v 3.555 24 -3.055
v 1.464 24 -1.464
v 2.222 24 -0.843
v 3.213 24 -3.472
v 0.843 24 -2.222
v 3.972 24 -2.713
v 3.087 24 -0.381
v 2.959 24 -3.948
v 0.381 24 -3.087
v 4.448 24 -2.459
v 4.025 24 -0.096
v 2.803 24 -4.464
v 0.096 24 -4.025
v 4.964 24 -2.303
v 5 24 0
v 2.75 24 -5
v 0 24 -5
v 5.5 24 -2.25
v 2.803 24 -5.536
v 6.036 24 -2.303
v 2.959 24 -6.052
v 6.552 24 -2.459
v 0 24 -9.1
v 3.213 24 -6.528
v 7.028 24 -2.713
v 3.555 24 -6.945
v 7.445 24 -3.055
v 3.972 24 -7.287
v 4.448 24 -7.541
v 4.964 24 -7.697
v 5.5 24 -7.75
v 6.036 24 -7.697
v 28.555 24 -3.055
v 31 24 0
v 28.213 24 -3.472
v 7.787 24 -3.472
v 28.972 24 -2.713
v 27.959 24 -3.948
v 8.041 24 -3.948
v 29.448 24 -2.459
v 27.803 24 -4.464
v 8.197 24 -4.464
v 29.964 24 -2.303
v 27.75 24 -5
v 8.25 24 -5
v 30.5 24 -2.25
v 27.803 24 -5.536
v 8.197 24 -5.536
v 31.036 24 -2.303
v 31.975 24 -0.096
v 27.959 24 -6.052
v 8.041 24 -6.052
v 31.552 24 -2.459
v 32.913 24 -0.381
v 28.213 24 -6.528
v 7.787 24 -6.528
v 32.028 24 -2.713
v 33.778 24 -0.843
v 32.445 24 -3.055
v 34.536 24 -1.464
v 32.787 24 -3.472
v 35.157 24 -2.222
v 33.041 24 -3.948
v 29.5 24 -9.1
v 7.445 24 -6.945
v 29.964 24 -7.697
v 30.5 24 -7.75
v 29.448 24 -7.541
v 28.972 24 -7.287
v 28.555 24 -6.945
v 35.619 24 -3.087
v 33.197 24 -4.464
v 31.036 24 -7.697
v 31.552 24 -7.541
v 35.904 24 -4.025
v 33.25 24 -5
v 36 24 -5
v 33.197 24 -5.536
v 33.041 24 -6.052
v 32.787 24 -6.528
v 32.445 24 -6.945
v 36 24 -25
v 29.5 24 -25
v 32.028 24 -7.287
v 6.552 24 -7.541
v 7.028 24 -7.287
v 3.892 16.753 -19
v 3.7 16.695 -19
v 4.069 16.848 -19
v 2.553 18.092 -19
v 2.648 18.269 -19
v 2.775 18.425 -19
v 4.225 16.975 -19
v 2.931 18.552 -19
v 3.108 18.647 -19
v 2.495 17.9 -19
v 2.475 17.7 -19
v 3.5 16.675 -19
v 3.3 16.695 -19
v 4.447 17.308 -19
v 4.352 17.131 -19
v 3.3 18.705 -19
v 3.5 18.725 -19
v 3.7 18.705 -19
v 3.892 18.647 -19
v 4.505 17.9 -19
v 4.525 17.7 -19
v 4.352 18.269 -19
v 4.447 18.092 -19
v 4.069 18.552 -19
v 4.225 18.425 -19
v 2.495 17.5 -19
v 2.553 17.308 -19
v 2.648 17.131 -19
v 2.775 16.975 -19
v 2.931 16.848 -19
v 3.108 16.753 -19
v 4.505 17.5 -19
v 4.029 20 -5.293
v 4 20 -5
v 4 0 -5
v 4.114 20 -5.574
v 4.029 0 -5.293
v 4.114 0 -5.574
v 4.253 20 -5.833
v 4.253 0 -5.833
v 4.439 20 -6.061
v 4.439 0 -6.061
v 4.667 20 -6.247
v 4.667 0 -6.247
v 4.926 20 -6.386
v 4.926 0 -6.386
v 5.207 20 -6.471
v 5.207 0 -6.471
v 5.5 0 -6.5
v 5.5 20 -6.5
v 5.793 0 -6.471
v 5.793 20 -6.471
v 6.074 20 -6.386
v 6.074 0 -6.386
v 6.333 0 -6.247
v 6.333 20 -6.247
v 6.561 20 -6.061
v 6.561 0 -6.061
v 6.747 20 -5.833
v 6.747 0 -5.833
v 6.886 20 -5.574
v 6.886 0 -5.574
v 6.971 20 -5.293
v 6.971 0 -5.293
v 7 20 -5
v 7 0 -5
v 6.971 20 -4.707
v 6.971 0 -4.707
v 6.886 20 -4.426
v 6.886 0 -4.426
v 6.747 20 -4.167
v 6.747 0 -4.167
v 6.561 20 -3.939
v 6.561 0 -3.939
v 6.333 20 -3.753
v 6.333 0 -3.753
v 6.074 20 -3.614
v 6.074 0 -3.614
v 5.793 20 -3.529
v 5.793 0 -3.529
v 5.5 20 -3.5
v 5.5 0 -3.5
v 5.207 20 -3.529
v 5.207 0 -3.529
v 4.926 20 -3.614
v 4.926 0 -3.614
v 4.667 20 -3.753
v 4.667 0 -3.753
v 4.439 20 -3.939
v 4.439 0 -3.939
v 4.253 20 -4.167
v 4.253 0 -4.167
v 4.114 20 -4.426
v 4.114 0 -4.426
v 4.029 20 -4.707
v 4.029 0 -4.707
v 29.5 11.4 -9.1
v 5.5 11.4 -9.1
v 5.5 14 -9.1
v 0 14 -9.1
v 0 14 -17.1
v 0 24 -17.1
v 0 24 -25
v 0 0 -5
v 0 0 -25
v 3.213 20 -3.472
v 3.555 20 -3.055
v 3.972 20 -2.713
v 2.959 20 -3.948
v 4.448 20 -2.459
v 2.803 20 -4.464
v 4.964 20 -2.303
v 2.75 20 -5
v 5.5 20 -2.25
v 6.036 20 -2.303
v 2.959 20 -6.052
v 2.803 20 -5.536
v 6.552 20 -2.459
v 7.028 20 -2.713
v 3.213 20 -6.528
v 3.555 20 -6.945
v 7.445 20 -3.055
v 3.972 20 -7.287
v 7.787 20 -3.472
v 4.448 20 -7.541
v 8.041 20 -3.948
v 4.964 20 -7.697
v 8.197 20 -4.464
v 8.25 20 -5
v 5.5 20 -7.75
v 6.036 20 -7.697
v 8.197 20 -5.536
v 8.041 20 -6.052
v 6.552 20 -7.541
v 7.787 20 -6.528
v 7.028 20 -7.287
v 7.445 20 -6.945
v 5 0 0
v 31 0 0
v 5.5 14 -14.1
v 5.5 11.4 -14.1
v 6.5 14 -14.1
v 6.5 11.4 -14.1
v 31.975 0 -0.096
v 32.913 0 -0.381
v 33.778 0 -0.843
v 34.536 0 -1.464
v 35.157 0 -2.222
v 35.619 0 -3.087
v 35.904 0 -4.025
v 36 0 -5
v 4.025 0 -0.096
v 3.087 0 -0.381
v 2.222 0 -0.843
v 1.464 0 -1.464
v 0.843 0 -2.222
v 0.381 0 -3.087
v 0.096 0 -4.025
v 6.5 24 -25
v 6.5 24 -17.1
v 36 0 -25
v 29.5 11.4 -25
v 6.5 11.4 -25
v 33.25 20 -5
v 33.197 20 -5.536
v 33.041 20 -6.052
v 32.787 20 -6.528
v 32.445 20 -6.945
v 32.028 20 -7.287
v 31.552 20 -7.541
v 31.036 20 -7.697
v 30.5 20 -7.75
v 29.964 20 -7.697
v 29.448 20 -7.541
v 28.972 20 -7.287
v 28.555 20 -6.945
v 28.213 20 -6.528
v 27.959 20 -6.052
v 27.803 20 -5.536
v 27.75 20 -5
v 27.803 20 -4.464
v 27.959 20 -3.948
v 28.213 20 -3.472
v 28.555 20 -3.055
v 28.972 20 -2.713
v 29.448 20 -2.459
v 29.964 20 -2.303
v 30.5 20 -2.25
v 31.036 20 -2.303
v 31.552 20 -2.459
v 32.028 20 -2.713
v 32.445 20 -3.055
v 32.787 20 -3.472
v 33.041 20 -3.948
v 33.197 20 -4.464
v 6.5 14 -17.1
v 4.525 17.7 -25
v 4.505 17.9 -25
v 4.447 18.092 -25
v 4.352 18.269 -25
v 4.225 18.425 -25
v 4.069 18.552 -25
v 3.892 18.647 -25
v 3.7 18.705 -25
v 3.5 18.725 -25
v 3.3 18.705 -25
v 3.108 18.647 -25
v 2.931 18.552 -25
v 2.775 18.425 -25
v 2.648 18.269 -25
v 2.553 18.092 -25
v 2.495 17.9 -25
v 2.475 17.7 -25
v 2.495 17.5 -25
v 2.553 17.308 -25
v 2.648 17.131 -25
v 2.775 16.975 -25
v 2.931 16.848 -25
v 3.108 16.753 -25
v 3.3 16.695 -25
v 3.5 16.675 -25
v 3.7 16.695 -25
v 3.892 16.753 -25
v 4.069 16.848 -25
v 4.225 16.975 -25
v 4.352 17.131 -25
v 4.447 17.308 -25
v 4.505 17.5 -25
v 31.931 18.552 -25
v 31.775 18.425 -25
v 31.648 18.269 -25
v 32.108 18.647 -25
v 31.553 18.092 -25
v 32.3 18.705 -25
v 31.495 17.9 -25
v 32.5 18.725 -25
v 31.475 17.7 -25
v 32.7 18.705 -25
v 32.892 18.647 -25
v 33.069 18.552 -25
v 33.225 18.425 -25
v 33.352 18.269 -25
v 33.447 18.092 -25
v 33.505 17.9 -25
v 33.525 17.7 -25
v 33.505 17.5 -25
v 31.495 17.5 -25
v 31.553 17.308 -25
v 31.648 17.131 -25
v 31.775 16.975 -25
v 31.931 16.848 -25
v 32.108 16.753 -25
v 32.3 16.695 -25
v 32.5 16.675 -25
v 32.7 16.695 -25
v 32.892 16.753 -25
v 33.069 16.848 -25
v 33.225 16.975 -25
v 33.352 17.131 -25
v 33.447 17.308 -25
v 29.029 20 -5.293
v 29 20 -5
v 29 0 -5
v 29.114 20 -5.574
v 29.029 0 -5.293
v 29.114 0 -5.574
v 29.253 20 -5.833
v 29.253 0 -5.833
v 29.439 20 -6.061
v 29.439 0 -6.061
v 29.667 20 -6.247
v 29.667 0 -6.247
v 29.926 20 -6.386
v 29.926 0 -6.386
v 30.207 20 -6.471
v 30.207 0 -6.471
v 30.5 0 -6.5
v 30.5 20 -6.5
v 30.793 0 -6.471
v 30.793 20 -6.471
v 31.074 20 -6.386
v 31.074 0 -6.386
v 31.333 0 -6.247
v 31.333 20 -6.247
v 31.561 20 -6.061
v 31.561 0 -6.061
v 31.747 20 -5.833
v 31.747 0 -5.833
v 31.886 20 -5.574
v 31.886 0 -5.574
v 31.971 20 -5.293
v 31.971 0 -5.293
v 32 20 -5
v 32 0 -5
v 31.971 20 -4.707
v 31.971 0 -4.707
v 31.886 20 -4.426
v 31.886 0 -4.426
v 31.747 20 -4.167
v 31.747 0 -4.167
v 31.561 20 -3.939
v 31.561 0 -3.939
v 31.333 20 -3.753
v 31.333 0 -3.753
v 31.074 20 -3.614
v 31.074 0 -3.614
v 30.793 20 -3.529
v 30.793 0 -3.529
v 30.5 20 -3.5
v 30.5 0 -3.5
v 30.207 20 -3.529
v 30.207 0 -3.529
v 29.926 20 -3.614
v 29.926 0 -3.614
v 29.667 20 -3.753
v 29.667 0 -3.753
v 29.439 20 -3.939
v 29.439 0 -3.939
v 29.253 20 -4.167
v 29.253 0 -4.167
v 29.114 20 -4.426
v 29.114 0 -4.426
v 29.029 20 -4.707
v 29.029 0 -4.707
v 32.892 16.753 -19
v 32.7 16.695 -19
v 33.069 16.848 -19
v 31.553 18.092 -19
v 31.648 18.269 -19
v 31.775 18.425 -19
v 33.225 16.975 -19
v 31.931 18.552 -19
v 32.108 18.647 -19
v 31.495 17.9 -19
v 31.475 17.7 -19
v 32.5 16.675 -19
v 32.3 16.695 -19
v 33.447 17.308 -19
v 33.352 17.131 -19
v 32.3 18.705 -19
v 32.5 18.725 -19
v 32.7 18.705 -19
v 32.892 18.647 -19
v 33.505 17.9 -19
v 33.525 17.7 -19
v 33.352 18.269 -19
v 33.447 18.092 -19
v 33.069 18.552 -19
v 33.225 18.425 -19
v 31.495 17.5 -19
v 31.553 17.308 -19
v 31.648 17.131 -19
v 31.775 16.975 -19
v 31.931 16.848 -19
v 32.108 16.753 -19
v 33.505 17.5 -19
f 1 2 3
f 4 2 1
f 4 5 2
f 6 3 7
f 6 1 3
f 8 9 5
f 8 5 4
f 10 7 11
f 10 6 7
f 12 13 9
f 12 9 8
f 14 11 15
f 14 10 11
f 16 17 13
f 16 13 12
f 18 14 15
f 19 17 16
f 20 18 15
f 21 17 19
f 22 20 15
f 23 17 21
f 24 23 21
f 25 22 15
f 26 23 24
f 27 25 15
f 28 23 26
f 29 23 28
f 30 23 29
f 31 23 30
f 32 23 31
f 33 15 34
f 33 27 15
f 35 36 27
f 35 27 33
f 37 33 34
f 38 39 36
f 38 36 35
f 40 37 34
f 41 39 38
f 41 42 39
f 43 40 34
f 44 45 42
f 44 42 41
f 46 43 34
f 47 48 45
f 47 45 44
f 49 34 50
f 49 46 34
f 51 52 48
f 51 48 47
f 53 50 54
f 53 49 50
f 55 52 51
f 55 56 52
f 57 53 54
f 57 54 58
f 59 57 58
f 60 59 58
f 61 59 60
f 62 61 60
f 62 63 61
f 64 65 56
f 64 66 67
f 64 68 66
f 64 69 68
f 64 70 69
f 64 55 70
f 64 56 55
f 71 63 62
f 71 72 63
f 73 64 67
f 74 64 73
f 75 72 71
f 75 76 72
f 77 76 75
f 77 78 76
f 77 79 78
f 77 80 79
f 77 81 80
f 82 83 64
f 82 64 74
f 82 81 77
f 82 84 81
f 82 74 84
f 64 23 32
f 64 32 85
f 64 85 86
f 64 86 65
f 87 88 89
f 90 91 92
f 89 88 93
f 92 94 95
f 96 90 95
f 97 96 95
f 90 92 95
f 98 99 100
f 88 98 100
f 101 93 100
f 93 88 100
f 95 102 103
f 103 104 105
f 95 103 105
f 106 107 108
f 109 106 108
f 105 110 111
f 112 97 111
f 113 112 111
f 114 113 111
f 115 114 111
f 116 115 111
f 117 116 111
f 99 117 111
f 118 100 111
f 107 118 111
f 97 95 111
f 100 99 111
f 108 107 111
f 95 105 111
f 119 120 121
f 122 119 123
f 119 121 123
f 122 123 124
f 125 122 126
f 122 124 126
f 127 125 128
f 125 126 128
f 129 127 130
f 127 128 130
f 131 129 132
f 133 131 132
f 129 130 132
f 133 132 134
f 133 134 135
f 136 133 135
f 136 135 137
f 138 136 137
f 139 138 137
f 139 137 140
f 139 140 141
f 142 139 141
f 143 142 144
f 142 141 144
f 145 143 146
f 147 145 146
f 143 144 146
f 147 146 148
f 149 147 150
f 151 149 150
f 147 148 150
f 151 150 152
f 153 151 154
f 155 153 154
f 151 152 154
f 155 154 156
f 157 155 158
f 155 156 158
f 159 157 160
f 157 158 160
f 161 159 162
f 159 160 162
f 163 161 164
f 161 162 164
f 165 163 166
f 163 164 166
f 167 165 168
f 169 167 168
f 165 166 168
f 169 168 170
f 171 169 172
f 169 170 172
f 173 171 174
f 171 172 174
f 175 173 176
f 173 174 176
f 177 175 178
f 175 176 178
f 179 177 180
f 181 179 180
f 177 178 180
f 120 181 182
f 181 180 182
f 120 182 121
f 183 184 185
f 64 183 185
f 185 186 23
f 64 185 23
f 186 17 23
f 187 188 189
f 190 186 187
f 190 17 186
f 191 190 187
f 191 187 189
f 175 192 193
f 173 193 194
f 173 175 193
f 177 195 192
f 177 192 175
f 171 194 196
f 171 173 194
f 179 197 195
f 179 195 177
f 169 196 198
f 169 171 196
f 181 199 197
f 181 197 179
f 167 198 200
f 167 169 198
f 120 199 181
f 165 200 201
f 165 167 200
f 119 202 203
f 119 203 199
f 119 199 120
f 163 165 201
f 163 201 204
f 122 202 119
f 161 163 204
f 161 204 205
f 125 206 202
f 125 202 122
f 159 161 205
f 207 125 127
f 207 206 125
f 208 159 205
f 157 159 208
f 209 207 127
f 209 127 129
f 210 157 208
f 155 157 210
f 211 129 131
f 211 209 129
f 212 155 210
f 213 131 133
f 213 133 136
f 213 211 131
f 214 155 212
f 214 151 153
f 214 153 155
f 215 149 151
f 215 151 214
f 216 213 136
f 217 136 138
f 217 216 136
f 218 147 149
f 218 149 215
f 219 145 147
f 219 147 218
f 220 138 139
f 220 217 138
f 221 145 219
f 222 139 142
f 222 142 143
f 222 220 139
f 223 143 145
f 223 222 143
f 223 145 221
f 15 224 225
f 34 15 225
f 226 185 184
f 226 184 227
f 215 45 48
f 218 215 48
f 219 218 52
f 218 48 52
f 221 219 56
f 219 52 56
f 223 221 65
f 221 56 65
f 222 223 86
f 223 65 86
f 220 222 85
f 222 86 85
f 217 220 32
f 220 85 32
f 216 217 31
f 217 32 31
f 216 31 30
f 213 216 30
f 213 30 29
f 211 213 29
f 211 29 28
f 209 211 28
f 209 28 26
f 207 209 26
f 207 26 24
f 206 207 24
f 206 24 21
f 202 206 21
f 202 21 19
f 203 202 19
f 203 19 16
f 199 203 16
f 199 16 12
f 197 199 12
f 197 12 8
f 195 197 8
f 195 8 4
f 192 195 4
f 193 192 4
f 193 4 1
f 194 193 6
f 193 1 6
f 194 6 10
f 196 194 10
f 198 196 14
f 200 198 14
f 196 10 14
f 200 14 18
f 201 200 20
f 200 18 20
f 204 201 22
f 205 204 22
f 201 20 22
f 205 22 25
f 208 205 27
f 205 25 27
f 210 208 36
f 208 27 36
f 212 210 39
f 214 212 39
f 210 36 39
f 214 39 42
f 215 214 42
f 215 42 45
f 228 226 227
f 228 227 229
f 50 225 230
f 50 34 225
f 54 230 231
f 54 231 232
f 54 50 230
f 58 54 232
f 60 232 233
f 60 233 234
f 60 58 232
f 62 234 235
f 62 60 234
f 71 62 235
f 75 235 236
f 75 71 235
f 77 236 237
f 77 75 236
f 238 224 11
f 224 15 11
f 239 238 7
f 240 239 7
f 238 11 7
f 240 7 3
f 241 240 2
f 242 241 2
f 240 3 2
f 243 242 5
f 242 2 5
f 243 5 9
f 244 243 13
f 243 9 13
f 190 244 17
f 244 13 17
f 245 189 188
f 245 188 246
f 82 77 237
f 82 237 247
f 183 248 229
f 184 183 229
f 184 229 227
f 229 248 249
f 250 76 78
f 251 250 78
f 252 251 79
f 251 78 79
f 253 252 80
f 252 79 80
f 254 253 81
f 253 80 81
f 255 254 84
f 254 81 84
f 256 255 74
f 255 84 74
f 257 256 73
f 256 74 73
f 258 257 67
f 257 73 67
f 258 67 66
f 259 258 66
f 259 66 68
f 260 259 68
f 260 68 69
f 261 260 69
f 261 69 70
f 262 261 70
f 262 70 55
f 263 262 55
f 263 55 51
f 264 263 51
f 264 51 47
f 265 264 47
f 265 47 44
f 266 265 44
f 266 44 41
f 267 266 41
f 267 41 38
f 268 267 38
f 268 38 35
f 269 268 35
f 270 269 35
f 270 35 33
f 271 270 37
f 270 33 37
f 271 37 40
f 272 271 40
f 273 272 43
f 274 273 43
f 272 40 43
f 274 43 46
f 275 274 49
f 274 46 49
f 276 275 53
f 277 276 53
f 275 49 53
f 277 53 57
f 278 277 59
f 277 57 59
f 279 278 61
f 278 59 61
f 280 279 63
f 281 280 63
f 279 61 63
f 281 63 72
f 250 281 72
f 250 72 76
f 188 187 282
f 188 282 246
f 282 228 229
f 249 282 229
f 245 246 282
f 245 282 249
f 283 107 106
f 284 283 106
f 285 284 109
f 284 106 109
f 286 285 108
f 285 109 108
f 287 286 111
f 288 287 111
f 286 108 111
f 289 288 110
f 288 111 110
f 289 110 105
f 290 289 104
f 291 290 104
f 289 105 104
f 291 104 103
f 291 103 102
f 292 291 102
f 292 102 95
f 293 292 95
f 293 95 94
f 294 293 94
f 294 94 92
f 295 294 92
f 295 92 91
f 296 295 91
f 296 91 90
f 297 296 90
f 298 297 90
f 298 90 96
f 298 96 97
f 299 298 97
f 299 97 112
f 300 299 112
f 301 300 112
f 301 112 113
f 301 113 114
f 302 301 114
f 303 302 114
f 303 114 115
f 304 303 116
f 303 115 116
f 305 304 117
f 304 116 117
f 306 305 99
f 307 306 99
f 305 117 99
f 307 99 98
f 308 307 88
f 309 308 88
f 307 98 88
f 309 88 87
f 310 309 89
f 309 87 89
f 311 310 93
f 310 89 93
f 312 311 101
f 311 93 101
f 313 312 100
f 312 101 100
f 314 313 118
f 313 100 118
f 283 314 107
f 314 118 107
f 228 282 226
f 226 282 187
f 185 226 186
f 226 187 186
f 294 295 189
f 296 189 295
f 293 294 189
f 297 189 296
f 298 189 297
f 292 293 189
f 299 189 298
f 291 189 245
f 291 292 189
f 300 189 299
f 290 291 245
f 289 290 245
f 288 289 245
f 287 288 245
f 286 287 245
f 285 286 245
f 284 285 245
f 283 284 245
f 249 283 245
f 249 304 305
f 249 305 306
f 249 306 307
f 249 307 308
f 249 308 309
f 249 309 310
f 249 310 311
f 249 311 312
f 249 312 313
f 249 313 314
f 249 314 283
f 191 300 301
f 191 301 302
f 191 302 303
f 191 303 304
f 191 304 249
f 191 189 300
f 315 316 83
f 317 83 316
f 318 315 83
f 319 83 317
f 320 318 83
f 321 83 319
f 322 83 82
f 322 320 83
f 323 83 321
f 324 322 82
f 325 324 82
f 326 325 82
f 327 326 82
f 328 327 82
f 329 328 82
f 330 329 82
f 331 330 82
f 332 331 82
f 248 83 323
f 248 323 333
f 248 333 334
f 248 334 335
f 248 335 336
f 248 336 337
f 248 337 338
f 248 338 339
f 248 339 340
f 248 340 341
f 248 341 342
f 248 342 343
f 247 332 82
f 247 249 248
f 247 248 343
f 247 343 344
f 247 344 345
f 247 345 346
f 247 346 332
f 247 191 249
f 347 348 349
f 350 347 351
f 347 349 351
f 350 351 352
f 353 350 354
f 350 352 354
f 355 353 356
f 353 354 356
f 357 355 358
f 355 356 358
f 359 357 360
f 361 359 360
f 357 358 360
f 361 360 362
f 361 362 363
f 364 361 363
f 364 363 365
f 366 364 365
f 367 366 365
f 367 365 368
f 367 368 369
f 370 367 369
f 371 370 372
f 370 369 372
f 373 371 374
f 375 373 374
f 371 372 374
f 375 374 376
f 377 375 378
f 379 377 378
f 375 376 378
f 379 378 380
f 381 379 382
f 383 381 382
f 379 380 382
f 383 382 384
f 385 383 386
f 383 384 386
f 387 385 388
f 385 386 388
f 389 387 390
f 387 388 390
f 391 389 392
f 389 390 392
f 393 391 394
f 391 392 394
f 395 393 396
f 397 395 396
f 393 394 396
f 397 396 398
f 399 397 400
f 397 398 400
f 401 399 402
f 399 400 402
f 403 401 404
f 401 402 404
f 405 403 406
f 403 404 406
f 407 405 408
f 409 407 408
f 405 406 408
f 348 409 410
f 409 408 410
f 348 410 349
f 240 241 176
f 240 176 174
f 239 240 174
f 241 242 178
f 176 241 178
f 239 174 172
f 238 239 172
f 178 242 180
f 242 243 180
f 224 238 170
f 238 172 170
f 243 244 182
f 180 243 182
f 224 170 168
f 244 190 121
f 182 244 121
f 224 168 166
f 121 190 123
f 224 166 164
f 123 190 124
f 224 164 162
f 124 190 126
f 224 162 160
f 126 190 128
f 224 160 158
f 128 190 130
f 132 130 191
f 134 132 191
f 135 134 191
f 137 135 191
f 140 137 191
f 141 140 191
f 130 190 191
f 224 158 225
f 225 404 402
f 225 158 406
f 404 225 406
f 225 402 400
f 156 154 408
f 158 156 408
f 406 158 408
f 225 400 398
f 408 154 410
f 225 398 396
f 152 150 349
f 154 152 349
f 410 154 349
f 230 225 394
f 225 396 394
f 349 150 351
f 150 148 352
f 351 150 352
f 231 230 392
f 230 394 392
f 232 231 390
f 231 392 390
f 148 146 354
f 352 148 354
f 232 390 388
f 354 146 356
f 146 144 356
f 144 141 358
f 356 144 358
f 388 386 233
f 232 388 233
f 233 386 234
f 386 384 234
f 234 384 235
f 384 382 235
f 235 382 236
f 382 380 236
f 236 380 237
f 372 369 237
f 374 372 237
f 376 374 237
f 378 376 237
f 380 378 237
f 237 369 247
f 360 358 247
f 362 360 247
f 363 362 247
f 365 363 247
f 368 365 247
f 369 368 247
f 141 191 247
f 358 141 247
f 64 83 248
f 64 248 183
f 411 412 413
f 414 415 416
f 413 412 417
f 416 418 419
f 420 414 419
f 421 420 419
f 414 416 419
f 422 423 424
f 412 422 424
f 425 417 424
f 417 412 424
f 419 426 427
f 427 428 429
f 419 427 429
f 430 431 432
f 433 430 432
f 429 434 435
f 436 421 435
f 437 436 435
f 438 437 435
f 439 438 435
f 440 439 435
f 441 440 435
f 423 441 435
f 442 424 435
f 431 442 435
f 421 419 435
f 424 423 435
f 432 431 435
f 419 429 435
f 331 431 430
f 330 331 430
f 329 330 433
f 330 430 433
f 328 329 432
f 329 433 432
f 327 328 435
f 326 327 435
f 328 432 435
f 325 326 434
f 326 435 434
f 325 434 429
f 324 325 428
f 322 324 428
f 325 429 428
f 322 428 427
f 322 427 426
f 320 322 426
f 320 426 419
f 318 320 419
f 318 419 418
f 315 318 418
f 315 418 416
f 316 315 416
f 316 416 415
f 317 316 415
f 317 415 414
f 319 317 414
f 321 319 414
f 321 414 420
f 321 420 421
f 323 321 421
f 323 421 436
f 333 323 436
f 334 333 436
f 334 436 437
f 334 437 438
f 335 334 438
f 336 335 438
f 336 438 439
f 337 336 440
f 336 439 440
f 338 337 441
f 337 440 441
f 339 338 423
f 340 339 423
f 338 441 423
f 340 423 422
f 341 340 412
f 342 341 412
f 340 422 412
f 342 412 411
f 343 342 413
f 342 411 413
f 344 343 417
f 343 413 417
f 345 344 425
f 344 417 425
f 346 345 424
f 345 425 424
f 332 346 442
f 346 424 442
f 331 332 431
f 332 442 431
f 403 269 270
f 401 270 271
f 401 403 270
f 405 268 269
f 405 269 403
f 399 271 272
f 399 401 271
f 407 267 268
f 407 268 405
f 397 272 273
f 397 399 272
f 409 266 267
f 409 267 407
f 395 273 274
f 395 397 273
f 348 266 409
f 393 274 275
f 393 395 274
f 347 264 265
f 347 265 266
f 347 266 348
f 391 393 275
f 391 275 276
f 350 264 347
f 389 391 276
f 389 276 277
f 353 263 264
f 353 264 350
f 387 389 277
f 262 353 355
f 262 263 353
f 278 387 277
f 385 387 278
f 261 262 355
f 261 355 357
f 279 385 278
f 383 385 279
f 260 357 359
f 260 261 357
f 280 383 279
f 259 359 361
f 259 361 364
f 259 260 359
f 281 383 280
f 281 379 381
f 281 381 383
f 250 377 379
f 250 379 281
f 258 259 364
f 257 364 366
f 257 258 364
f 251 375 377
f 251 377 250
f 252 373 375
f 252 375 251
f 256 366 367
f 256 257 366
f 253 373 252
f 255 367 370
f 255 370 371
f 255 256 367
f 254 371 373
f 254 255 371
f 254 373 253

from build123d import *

# Parameters (mm, degrees)
SKETCH2_W                          = 36
SKETCH2_H                          = 25
BOSS_EXTRUDE1_DEPTH                = 24
CUT_EXTRUDE1_DEPTH                 = 12.6
TAP_DRILL_FOR_M2_5X0_45_TAP1_D     = 2.05
TAP_DRILL_FOR_M2_5X0_45_TAP1_DEPTH = 6
FILLET2_R                          = 5
CBORE_FOR_M2_5_SHCS1_D             = 3
CBORE_FOR_M2_5_SHCS1_CBORE_D       = 5.5
CBORE_FOR_M2_5_SHCS1_CBORE_DEPTH   = 4
SKETCH8_W                          = 8
SKETCH8_H                          = 10
CUT_EXTRUDE2_DEPTH                 = 10
FILLET3_R                          = 5


with BuildPart() as part:
    # Sketch2 → Boss-Extrude1 (new body)
    with BuildSketch(Plane(origin=(0, 0, 0), x_dir=(1, 0, 0), z_dir=(0, 1, 0))):
        with Locations((18, 12.5)):
            Rectangle(SKETCH2_W, SKETCH2_H)
    extrude(amount=BOSS_EXTRUDE1_DEPTH)

    # Sketch3 → Cut-Extrude1 (cut)
    with BuildSketch(Plane(origin=(0, 24, 0), x_dir=(1, 0, 0), z_dir=(0, 1, 0))):
        Polygon((6.5, 25), (29.5, 25), (29.5, 9.1), (6.5, 9.1), (5.5, 9.1), (5.5, 14.1), (6.5, 14.1), align=None)
    extrude(amount=-CUT_EXTRUDE1_DEPTH, mode=Mode.SUBTRACT)

    # Tap Drill for M2.5x0.45 Tap1
    with Locations(Plane(origin=(0, 0, -25), x_dir=(-1, 0, 0), z_dir=(0, 0, -1))):
        with Locations((-32.5, 17.7), (-3.5, 17.7)):
            Hole(TAP_DRILL_FOR_M2_5X0_45_TAP1_D / 2, depth=TAP_DRILL_FOR_M2_5X0_45_TAP1_DEPTH)

    # Fillet2
    fillet2_edges = [part.edges().sort_by_distance(p)[0] for p in [
        (36, 12, 0),
    ]]
    fillet(fillet2_edges, radius=FILLET2_R)

    # CBORE for M2.5 SHCS1 (through all)
    with Locations(Plane(origin=(0, 24, 0), x_dir=(1, 0, 0), z_dir=(0, 1, 0))):
        with Locations((30.5, 5), (5.5, 5)):
            CounterBoreHole(CBORE_FOR_M2_5_SHCS1_D / 2, CBORE_FOR_M2_5_SHCS1_CBORE_D / 2, CBORE_FOR_M2_5_SHCS1_CBORE_DEPTH)

    # Sketch8 → Cut-Extrude2 (cut)
    with BuildSketch(Plane.ZY):
        with Locations((-13.1, 19)):
            Rectangle(SKETCH8_W, SKETCH8_H)
    extrude(amount=-CUT_EXTRUDE2_DEPTH, mode=Mode.SUBTRACT)

    # Fillet3
    fillet3_edges = [part.edges().sort_by_distance(p)[0] for p in [
        (0, 12, 0),
    ]]
    fillet(fillet3_edges, radius=FILLET3_R)


solid = part.part
